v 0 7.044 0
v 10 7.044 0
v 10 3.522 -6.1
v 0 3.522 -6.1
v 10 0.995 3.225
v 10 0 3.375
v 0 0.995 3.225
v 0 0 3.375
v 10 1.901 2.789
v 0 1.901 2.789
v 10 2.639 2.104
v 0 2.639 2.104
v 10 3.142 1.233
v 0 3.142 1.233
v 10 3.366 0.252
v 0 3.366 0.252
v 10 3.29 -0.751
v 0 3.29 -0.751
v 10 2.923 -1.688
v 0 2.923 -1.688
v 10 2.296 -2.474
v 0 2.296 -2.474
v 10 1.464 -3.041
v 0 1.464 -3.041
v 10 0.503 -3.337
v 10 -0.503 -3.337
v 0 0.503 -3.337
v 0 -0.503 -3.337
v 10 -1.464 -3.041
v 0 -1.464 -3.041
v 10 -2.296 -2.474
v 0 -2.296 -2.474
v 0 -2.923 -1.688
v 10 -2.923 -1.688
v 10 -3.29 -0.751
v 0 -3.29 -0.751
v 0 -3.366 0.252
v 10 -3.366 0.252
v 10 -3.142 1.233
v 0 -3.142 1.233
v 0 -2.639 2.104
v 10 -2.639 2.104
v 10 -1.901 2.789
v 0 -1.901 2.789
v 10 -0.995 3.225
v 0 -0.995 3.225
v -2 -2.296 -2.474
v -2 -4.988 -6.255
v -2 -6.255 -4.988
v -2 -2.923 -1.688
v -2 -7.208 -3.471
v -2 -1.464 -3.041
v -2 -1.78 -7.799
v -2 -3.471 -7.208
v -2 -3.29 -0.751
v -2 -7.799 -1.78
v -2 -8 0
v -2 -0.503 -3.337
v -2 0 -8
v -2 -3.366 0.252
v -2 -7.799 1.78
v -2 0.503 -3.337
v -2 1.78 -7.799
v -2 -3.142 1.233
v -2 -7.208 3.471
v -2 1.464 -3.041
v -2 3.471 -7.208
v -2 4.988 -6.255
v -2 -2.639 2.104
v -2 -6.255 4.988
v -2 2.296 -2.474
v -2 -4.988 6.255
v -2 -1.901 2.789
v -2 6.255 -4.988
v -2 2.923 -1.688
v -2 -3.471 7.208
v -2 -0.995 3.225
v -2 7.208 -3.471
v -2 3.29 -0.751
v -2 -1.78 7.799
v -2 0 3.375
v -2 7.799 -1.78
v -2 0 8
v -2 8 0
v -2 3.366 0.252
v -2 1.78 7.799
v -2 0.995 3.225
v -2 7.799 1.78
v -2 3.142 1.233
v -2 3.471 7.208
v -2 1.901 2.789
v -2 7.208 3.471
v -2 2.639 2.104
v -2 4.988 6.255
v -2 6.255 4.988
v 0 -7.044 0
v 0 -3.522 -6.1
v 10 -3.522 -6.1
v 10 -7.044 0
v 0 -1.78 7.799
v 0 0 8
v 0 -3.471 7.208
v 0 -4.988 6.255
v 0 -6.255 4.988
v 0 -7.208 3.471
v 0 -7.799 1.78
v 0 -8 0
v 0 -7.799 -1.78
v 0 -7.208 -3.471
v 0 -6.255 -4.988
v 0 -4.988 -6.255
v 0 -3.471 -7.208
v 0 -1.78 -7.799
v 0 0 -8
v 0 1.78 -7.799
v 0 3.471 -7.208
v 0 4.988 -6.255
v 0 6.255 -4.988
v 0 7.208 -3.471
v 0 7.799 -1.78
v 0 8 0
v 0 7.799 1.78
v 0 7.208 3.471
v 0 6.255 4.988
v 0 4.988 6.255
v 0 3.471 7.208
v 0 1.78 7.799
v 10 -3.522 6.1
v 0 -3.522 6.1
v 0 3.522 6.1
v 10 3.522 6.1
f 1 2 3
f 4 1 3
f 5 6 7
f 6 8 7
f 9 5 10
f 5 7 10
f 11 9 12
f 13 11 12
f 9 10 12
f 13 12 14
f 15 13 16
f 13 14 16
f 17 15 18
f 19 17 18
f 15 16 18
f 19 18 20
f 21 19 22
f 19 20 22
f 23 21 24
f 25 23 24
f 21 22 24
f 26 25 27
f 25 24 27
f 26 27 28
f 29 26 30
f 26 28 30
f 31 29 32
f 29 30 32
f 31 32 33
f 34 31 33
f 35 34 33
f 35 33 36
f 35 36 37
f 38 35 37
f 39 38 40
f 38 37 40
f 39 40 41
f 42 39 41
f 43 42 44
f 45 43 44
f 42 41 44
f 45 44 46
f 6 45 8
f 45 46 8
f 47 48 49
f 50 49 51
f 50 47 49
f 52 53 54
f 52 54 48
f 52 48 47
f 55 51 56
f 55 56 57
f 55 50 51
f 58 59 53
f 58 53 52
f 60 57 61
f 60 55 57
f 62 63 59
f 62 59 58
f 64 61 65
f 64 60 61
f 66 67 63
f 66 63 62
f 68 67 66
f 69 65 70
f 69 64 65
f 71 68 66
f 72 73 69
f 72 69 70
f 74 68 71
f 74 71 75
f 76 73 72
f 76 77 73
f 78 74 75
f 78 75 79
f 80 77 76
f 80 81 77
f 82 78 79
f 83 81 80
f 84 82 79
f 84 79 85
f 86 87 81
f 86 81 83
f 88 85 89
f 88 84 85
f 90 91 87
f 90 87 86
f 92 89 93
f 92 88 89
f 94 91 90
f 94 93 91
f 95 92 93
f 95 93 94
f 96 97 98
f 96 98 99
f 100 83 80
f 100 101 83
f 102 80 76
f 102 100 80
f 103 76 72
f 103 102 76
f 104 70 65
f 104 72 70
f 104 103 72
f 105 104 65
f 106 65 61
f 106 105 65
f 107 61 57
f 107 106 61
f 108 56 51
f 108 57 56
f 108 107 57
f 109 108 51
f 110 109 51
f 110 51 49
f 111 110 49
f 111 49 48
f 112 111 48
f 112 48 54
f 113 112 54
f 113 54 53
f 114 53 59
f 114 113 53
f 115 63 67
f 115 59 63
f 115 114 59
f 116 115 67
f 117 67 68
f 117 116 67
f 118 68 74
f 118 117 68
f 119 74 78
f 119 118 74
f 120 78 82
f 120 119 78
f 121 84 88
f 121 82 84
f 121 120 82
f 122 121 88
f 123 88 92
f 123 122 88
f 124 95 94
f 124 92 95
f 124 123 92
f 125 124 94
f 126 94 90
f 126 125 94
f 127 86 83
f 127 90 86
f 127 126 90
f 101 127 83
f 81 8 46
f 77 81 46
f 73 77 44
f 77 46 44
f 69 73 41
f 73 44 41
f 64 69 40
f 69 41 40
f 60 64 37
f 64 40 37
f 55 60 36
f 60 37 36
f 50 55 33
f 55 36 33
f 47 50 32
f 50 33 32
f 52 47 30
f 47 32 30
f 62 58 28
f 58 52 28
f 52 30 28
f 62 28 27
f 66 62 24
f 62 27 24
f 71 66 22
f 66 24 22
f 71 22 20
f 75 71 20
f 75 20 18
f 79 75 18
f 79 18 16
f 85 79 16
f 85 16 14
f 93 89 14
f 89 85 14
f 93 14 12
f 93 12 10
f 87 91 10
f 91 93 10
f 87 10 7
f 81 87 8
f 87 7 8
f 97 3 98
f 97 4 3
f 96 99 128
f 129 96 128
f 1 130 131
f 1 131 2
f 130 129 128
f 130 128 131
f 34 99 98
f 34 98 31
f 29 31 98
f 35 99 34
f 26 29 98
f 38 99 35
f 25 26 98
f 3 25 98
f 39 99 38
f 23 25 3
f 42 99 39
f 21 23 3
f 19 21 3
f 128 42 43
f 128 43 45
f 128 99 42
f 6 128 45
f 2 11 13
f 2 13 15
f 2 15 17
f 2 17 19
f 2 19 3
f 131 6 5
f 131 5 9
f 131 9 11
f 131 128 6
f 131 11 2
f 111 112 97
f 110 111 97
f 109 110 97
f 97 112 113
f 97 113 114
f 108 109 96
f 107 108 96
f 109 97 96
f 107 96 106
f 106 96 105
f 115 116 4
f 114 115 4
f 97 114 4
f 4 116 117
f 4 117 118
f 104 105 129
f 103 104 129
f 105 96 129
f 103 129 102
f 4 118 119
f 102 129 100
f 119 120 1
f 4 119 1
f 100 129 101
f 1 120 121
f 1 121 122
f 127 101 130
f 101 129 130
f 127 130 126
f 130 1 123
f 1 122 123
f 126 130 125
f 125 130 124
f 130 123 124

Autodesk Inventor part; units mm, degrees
ref_plane "YZ Plane" through (0, 0, 0) normal (1, 0, 0) x (0, 1, 0)
ref_plane "XZ Plane" through (0, 0, 0) normal (0, 1, 0) x (-1, 0, 0)
ref_plane "XY Plane" through (0, 0, 0) normal (0, 0, 1) x (1, 0, 0)
sketch "Sketch1" plane through (0, 0, 0) normal (1, 0, 0) x (0, 1, 0)
  line L0 (0, 0) -> (0, 6.1) construction
  line L1 (3.5218, 6.1) -> (7.0437, 0)
  line L2 (7.0437, 0) -> (3.5218, -6.1)
  line L3 (3.5218, -6.1) -> (-3.5218, -6.1)
  line L4 (-3.5218, -6.1) -> (-7.0437, 0)
  line L5 (-7.0437, 0) -> (-3.5218, 6.1)
  line L6 (-3.5218, 6.1) -> (3.5218, 6.1)
  dimension "d0" = 6.1
extrude "Extrusion1" add sketch "Sketch1" along normal blind 10
sketch "Sketch2" plane through (0, 0, 0) normal (-1, 0, 0) x (0, 0, 1)
  circle A0 centre (0, 0) radius 3.375
  circle A1 centre (0, 0) radius 8
  dimension "d3" = 6.75
  dimension "d4" = 16
extrude "Extrusion2" add sketch "Sketch2" along normal blind 2
sketch "Sketch3" plane through (0, 0, 0) normal (-1, 0, 0) x (0, 0, 1)
  circle A0 centre (0, 0) radius 3.375
extrude "Extrusion3" cut sketch "Sketch3" against normal blind 10
properties part number "smallHub 9-28"
